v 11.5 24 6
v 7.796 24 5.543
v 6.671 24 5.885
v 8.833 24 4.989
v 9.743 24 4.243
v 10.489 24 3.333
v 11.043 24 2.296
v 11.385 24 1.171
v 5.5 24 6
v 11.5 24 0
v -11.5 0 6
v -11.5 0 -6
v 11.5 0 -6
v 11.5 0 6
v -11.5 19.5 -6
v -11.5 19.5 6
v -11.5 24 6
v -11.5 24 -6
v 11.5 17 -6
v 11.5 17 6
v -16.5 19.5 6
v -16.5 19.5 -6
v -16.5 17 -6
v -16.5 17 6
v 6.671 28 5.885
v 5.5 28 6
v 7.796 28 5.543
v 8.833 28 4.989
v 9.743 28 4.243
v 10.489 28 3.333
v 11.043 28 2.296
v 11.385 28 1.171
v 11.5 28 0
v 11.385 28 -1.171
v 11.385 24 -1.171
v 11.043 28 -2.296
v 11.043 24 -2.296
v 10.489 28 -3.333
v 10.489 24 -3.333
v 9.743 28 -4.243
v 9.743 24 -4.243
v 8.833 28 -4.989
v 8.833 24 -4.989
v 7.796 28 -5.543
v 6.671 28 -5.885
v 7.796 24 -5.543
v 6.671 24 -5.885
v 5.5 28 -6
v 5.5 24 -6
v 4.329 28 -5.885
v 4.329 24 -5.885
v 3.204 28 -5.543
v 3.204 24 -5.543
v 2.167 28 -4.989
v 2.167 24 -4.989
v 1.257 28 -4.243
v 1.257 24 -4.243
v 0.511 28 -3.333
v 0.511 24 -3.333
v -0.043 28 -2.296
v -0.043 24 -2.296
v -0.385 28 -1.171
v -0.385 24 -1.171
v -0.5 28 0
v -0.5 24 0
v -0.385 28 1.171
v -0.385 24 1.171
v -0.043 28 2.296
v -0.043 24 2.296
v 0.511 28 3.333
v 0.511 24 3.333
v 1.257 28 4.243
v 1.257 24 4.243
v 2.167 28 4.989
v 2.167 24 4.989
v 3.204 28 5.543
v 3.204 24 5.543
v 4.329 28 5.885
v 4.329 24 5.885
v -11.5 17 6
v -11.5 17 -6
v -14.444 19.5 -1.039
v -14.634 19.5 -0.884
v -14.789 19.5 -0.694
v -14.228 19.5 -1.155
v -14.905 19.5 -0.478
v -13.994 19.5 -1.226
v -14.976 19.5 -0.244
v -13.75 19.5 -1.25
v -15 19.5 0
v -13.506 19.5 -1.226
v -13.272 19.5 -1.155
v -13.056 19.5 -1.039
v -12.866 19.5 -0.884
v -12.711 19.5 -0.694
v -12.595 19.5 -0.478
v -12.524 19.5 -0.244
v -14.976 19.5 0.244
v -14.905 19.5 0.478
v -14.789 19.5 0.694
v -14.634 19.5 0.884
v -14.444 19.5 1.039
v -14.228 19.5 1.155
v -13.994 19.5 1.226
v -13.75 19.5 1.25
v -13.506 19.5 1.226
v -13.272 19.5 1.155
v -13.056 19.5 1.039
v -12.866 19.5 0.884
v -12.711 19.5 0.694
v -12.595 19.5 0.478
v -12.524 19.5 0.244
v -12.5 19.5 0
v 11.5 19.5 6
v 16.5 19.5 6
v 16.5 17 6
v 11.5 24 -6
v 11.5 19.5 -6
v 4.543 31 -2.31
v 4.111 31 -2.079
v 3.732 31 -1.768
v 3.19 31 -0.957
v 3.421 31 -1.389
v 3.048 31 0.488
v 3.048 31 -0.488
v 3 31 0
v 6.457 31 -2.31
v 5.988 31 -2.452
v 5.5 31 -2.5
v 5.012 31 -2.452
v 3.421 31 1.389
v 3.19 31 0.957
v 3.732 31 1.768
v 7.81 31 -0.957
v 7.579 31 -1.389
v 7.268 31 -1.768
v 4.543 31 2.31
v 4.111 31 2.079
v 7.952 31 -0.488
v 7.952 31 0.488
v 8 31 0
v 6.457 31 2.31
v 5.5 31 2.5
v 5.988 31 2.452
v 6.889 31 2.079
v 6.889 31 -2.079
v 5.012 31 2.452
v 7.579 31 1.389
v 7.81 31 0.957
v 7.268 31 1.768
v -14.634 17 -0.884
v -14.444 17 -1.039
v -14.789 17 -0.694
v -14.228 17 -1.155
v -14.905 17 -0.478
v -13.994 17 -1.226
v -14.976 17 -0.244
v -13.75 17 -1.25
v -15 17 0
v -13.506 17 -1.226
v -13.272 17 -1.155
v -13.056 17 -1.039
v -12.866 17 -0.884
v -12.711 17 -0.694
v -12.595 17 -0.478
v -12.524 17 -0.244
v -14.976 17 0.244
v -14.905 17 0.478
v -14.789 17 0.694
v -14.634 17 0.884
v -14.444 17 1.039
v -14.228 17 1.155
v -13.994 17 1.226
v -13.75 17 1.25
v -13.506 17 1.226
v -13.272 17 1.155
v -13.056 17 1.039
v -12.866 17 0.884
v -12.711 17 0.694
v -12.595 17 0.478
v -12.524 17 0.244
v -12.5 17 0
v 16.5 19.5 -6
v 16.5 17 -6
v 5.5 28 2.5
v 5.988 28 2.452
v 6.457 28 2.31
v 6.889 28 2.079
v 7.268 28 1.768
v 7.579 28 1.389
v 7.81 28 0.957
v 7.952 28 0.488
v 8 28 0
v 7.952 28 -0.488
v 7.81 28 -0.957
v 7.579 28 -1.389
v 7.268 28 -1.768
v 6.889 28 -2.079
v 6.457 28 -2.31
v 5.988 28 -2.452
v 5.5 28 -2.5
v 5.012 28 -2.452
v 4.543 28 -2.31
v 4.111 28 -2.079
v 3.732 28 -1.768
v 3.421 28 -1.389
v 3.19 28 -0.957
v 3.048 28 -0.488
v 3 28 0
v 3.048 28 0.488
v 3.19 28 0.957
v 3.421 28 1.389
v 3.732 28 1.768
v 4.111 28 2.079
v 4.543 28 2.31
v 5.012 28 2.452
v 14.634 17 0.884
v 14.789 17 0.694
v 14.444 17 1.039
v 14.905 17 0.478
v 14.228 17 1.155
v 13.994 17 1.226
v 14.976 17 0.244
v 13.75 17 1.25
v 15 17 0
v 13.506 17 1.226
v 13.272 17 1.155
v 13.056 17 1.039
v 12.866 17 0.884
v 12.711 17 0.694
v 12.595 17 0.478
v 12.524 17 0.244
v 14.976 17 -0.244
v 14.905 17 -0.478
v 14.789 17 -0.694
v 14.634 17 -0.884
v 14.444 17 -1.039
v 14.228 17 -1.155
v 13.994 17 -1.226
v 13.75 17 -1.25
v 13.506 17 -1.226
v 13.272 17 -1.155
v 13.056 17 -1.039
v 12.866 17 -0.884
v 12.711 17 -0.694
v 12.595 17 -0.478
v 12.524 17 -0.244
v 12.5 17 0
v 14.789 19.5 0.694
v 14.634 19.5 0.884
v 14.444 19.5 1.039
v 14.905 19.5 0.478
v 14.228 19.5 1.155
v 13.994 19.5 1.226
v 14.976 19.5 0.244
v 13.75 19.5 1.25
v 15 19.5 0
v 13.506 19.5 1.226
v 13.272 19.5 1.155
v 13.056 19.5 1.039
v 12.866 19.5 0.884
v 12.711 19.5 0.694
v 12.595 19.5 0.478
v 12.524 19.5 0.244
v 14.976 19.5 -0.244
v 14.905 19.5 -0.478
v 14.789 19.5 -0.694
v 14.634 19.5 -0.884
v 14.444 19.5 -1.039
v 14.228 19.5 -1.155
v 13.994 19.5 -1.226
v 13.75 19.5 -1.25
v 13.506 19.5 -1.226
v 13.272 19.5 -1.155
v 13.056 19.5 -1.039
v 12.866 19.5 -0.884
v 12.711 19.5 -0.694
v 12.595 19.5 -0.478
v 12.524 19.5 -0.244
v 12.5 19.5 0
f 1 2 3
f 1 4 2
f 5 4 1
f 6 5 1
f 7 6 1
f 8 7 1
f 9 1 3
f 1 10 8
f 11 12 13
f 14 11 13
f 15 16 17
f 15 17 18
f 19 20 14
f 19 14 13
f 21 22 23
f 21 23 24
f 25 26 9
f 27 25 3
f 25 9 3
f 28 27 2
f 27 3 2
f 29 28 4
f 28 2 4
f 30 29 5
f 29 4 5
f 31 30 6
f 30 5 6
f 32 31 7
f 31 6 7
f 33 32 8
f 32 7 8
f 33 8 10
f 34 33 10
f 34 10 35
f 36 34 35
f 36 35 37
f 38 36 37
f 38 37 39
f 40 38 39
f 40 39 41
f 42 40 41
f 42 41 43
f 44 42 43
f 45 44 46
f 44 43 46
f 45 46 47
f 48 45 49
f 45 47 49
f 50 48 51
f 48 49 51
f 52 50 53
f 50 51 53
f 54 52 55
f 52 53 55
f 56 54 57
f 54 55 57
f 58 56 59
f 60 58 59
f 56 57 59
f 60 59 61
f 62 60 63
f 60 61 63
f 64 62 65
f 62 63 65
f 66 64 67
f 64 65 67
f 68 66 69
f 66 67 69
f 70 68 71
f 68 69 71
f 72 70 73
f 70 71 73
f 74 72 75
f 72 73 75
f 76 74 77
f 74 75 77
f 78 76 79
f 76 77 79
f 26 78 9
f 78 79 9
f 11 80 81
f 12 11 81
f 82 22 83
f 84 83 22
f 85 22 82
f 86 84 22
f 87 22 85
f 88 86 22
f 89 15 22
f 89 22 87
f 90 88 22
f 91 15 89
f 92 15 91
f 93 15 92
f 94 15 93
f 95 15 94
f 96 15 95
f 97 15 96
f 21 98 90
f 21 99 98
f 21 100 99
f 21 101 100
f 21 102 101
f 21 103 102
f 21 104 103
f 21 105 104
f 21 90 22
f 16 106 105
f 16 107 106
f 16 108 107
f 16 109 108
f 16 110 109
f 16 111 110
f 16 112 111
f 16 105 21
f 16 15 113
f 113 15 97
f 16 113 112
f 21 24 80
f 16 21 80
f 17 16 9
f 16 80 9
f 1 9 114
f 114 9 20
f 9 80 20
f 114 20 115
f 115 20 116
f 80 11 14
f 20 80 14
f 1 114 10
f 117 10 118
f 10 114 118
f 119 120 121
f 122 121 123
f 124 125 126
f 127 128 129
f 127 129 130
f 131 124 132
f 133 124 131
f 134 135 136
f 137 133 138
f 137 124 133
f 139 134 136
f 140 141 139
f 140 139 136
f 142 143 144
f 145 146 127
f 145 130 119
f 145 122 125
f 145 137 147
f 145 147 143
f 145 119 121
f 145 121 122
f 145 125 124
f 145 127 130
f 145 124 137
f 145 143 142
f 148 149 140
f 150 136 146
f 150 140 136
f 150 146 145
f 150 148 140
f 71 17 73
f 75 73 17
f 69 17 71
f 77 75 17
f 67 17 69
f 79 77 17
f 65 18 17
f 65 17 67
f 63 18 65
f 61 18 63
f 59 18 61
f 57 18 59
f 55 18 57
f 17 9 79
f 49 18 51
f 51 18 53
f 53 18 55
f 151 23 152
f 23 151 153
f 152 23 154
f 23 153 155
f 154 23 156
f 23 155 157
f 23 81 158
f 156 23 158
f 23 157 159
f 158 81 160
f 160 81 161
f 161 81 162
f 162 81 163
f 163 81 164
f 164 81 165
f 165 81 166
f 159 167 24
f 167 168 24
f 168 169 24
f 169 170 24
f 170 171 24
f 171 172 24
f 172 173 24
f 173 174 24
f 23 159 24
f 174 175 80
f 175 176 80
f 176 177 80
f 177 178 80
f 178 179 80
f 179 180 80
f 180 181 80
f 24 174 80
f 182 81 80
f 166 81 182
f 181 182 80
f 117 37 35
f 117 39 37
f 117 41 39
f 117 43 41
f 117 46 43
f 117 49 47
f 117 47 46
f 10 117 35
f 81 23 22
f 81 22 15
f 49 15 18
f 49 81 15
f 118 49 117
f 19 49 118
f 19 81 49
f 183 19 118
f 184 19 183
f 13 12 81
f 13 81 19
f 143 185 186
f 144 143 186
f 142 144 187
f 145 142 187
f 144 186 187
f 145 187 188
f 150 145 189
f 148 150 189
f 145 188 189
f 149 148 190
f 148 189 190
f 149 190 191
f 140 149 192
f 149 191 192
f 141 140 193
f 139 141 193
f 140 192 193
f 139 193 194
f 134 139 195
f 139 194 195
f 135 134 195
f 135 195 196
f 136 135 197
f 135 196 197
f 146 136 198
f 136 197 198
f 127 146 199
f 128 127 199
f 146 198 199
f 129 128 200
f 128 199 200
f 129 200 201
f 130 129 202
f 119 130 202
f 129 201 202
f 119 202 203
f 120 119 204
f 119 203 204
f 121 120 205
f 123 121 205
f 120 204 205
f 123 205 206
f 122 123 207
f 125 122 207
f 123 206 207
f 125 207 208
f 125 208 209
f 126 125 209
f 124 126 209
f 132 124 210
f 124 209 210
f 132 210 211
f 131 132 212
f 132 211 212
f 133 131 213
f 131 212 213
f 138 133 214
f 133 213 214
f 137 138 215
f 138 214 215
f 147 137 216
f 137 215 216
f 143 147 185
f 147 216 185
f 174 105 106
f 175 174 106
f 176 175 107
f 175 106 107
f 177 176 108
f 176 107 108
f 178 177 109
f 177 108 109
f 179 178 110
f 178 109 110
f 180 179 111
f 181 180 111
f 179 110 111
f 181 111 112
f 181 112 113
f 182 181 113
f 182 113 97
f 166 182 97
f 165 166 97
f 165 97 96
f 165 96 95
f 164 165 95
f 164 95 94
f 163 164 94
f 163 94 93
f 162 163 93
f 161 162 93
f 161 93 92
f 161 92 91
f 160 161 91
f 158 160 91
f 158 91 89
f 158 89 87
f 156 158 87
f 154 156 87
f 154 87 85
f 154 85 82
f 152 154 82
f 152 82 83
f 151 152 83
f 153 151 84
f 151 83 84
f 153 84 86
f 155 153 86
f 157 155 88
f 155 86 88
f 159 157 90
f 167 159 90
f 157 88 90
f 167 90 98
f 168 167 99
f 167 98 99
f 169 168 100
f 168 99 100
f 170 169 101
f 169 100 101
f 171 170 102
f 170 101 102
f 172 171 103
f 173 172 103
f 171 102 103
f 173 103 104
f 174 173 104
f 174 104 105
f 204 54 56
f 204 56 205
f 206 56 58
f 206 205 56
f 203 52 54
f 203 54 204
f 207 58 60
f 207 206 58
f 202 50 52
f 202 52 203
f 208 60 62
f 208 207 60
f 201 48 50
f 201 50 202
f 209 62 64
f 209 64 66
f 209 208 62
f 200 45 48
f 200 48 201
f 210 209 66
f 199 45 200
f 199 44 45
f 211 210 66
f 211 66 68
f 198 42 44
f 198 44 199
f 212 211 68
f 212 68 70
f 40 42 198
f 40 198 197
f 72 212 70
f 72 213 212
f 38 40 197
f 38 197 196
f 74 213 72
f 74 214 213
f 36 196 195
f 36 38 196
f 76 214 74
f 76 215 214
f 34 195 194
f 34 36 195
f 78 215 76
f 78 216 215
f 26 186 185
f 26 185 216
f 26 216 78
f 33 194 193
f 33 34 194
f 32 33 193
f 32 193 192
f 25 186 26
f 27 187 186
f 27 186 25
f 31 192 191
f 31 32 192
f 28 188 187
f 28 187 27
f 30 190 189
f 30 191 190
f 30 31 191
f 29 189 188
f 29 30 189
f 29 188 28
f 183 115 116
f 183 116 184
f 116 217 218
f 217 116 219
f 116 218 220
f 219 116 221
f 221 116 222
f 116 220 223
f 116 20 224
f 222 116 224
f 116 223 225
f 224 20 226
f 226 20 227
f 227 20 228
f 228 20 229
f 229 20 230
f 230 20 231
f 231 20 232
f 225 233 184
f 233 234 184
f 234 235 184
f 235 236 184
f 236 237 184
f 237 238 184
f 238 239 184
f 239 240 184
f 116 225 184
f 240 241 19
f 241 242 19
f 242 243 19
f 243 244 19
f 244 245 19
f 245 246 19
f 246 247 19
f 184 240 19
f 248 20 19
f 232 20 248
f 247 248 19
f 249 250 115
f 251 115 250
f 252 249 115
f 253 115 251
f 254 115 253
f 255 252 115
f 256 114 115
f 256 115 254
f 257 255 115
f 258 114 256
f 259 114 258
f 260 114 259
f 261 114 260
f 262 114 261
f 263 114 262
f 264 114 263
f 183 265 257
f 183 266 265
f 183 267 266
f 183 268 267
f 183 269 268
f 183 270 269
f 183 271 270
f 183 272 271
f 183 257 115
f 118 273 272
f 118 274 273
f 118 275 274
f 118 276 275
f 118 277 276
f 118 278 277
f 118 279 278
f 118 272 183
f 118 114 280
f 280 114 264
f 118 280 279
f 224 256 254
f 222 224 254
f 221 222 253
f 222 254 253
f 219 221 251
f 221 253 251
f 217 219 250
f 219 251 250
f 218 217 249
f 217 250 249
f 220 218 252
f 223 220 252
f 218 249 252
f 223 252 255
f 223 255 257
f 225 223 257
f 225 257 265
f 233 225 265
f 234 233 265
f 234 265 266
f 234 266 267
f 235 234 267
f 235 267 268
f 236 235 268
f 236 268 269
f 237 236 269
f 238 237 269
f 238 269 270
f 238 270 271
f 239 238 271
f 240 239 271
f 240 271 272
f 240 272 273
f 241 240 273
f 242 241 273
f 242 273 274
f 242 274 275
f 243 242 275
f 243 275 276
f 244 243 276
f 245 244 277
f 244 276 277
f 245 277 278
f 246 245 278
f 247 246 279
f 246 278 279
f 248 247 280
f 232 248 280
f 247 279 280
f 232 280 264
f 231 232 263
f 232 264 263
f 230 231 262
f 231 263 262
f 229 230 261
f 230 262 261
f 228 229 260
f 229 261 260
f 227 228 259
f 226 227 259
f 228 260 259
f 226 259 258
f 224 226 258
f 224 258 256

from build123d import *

# Parameters (mm, degrees)
SKETCH_1_W          = 23
SKETCH_1_H          = 12
EXTRUDE_1_DEPTH     = 24
SKETCH_2_W          = 12
SKETCH_2_H          = 2.5
EXTRUDE_2_DEPTH     = 5
SKETCH_3_W          = 12
SKETCH_3_H          = 2.5
EXTRUDE_3_DEPTH     = 5
SKETCH_4_R          = 6
EXTRUDE_4_DEPTH     = 4
SKETCH_5_R          = 2.5
EXTRUDE_5_DEPTH     = 3
SKETCH_6_R          = 1.25
CUT_EXTRUDE_1_DEPTH = 3


with BuildPart() as part:
    # 草图1 → 凸台-拉伸1 (new body)
    with BuildSketch(Plane(origin=(0, 0, 0), x_dir=(1, 0, 0), z_dir=(0, 1, 0))):
        Rectangle(SKETCH_1_W, SKETCH_1_H)
    extrude(amount=EXTRUDE_1_DEPTH)

    # 草图2 → 凸台-拉伸2 (add)
    with BuildSketch(Plane(origin=(11.5, 0, 0), x_dir=(0, 0, -1), z_dir=(1, 0, 0))):
        with Locations((0, 18.25)):
            Rectangle(SKETCH_2_W, SKETCH_2_H)
    extrude(amount=EXTRUDE_2_DEPTH)

    # 草图3 → 凸台-拉伸3 (add)
    with BuildSketch(Plane.ZY.offset(11.5)):
        with Locations((0, 18.25)):
            Rectangle(SKETCH_3_W, SKETCH_3_H)
    extrude(amount=EXTRUDE_3_DEPTH)

    # 草图4 → 凸台-拉伸4 (add)
    with BuildSketch(Plane(origin=(0, 24, 0), x_dir=(1, 0, 0), z_dir=(0, 1, 0))):
        with Locations(Location((5.5, 0, 0), (0, 0, 270))):
            Circle(SKETCH_4_R)
    extrude(amount=EXTRUDE_4_DEPTH)

    # 草图5 → 凸台-拉伸5 (add)
    with BuildSketch(Plane(origin=(0, 28, 0), x_dir=(1, 0, 0), z_dir=(0, 1, 0))):
        with Locations(Location((5.5, 0, 0), (0, 0, 270))):
            Circle(SKETCH_5_R)
    extrude(amount=EXTRUDE_5_DEPTH)

    # 草图6 → 切除-拉伸1 (cut)
    with BuildSketch(Plane(origin=(0, 19.5, 0), x_dir=(1, 0, 0), z_dir=(0, 1, 0))):
        with Locations(Location((13.75, 0, 0), (0, 0, 270))):
            Circle(SKETCH_6_R)
        with Locations(Location((-13.75, 0, 0), (0, 0, 270))):
            Circle(SKETCH_6_R)
    extrude(amount=-CUT_EXTRUDE_1_DEPTH, mode=Mode.SUBTRACT)


solid = part.part
